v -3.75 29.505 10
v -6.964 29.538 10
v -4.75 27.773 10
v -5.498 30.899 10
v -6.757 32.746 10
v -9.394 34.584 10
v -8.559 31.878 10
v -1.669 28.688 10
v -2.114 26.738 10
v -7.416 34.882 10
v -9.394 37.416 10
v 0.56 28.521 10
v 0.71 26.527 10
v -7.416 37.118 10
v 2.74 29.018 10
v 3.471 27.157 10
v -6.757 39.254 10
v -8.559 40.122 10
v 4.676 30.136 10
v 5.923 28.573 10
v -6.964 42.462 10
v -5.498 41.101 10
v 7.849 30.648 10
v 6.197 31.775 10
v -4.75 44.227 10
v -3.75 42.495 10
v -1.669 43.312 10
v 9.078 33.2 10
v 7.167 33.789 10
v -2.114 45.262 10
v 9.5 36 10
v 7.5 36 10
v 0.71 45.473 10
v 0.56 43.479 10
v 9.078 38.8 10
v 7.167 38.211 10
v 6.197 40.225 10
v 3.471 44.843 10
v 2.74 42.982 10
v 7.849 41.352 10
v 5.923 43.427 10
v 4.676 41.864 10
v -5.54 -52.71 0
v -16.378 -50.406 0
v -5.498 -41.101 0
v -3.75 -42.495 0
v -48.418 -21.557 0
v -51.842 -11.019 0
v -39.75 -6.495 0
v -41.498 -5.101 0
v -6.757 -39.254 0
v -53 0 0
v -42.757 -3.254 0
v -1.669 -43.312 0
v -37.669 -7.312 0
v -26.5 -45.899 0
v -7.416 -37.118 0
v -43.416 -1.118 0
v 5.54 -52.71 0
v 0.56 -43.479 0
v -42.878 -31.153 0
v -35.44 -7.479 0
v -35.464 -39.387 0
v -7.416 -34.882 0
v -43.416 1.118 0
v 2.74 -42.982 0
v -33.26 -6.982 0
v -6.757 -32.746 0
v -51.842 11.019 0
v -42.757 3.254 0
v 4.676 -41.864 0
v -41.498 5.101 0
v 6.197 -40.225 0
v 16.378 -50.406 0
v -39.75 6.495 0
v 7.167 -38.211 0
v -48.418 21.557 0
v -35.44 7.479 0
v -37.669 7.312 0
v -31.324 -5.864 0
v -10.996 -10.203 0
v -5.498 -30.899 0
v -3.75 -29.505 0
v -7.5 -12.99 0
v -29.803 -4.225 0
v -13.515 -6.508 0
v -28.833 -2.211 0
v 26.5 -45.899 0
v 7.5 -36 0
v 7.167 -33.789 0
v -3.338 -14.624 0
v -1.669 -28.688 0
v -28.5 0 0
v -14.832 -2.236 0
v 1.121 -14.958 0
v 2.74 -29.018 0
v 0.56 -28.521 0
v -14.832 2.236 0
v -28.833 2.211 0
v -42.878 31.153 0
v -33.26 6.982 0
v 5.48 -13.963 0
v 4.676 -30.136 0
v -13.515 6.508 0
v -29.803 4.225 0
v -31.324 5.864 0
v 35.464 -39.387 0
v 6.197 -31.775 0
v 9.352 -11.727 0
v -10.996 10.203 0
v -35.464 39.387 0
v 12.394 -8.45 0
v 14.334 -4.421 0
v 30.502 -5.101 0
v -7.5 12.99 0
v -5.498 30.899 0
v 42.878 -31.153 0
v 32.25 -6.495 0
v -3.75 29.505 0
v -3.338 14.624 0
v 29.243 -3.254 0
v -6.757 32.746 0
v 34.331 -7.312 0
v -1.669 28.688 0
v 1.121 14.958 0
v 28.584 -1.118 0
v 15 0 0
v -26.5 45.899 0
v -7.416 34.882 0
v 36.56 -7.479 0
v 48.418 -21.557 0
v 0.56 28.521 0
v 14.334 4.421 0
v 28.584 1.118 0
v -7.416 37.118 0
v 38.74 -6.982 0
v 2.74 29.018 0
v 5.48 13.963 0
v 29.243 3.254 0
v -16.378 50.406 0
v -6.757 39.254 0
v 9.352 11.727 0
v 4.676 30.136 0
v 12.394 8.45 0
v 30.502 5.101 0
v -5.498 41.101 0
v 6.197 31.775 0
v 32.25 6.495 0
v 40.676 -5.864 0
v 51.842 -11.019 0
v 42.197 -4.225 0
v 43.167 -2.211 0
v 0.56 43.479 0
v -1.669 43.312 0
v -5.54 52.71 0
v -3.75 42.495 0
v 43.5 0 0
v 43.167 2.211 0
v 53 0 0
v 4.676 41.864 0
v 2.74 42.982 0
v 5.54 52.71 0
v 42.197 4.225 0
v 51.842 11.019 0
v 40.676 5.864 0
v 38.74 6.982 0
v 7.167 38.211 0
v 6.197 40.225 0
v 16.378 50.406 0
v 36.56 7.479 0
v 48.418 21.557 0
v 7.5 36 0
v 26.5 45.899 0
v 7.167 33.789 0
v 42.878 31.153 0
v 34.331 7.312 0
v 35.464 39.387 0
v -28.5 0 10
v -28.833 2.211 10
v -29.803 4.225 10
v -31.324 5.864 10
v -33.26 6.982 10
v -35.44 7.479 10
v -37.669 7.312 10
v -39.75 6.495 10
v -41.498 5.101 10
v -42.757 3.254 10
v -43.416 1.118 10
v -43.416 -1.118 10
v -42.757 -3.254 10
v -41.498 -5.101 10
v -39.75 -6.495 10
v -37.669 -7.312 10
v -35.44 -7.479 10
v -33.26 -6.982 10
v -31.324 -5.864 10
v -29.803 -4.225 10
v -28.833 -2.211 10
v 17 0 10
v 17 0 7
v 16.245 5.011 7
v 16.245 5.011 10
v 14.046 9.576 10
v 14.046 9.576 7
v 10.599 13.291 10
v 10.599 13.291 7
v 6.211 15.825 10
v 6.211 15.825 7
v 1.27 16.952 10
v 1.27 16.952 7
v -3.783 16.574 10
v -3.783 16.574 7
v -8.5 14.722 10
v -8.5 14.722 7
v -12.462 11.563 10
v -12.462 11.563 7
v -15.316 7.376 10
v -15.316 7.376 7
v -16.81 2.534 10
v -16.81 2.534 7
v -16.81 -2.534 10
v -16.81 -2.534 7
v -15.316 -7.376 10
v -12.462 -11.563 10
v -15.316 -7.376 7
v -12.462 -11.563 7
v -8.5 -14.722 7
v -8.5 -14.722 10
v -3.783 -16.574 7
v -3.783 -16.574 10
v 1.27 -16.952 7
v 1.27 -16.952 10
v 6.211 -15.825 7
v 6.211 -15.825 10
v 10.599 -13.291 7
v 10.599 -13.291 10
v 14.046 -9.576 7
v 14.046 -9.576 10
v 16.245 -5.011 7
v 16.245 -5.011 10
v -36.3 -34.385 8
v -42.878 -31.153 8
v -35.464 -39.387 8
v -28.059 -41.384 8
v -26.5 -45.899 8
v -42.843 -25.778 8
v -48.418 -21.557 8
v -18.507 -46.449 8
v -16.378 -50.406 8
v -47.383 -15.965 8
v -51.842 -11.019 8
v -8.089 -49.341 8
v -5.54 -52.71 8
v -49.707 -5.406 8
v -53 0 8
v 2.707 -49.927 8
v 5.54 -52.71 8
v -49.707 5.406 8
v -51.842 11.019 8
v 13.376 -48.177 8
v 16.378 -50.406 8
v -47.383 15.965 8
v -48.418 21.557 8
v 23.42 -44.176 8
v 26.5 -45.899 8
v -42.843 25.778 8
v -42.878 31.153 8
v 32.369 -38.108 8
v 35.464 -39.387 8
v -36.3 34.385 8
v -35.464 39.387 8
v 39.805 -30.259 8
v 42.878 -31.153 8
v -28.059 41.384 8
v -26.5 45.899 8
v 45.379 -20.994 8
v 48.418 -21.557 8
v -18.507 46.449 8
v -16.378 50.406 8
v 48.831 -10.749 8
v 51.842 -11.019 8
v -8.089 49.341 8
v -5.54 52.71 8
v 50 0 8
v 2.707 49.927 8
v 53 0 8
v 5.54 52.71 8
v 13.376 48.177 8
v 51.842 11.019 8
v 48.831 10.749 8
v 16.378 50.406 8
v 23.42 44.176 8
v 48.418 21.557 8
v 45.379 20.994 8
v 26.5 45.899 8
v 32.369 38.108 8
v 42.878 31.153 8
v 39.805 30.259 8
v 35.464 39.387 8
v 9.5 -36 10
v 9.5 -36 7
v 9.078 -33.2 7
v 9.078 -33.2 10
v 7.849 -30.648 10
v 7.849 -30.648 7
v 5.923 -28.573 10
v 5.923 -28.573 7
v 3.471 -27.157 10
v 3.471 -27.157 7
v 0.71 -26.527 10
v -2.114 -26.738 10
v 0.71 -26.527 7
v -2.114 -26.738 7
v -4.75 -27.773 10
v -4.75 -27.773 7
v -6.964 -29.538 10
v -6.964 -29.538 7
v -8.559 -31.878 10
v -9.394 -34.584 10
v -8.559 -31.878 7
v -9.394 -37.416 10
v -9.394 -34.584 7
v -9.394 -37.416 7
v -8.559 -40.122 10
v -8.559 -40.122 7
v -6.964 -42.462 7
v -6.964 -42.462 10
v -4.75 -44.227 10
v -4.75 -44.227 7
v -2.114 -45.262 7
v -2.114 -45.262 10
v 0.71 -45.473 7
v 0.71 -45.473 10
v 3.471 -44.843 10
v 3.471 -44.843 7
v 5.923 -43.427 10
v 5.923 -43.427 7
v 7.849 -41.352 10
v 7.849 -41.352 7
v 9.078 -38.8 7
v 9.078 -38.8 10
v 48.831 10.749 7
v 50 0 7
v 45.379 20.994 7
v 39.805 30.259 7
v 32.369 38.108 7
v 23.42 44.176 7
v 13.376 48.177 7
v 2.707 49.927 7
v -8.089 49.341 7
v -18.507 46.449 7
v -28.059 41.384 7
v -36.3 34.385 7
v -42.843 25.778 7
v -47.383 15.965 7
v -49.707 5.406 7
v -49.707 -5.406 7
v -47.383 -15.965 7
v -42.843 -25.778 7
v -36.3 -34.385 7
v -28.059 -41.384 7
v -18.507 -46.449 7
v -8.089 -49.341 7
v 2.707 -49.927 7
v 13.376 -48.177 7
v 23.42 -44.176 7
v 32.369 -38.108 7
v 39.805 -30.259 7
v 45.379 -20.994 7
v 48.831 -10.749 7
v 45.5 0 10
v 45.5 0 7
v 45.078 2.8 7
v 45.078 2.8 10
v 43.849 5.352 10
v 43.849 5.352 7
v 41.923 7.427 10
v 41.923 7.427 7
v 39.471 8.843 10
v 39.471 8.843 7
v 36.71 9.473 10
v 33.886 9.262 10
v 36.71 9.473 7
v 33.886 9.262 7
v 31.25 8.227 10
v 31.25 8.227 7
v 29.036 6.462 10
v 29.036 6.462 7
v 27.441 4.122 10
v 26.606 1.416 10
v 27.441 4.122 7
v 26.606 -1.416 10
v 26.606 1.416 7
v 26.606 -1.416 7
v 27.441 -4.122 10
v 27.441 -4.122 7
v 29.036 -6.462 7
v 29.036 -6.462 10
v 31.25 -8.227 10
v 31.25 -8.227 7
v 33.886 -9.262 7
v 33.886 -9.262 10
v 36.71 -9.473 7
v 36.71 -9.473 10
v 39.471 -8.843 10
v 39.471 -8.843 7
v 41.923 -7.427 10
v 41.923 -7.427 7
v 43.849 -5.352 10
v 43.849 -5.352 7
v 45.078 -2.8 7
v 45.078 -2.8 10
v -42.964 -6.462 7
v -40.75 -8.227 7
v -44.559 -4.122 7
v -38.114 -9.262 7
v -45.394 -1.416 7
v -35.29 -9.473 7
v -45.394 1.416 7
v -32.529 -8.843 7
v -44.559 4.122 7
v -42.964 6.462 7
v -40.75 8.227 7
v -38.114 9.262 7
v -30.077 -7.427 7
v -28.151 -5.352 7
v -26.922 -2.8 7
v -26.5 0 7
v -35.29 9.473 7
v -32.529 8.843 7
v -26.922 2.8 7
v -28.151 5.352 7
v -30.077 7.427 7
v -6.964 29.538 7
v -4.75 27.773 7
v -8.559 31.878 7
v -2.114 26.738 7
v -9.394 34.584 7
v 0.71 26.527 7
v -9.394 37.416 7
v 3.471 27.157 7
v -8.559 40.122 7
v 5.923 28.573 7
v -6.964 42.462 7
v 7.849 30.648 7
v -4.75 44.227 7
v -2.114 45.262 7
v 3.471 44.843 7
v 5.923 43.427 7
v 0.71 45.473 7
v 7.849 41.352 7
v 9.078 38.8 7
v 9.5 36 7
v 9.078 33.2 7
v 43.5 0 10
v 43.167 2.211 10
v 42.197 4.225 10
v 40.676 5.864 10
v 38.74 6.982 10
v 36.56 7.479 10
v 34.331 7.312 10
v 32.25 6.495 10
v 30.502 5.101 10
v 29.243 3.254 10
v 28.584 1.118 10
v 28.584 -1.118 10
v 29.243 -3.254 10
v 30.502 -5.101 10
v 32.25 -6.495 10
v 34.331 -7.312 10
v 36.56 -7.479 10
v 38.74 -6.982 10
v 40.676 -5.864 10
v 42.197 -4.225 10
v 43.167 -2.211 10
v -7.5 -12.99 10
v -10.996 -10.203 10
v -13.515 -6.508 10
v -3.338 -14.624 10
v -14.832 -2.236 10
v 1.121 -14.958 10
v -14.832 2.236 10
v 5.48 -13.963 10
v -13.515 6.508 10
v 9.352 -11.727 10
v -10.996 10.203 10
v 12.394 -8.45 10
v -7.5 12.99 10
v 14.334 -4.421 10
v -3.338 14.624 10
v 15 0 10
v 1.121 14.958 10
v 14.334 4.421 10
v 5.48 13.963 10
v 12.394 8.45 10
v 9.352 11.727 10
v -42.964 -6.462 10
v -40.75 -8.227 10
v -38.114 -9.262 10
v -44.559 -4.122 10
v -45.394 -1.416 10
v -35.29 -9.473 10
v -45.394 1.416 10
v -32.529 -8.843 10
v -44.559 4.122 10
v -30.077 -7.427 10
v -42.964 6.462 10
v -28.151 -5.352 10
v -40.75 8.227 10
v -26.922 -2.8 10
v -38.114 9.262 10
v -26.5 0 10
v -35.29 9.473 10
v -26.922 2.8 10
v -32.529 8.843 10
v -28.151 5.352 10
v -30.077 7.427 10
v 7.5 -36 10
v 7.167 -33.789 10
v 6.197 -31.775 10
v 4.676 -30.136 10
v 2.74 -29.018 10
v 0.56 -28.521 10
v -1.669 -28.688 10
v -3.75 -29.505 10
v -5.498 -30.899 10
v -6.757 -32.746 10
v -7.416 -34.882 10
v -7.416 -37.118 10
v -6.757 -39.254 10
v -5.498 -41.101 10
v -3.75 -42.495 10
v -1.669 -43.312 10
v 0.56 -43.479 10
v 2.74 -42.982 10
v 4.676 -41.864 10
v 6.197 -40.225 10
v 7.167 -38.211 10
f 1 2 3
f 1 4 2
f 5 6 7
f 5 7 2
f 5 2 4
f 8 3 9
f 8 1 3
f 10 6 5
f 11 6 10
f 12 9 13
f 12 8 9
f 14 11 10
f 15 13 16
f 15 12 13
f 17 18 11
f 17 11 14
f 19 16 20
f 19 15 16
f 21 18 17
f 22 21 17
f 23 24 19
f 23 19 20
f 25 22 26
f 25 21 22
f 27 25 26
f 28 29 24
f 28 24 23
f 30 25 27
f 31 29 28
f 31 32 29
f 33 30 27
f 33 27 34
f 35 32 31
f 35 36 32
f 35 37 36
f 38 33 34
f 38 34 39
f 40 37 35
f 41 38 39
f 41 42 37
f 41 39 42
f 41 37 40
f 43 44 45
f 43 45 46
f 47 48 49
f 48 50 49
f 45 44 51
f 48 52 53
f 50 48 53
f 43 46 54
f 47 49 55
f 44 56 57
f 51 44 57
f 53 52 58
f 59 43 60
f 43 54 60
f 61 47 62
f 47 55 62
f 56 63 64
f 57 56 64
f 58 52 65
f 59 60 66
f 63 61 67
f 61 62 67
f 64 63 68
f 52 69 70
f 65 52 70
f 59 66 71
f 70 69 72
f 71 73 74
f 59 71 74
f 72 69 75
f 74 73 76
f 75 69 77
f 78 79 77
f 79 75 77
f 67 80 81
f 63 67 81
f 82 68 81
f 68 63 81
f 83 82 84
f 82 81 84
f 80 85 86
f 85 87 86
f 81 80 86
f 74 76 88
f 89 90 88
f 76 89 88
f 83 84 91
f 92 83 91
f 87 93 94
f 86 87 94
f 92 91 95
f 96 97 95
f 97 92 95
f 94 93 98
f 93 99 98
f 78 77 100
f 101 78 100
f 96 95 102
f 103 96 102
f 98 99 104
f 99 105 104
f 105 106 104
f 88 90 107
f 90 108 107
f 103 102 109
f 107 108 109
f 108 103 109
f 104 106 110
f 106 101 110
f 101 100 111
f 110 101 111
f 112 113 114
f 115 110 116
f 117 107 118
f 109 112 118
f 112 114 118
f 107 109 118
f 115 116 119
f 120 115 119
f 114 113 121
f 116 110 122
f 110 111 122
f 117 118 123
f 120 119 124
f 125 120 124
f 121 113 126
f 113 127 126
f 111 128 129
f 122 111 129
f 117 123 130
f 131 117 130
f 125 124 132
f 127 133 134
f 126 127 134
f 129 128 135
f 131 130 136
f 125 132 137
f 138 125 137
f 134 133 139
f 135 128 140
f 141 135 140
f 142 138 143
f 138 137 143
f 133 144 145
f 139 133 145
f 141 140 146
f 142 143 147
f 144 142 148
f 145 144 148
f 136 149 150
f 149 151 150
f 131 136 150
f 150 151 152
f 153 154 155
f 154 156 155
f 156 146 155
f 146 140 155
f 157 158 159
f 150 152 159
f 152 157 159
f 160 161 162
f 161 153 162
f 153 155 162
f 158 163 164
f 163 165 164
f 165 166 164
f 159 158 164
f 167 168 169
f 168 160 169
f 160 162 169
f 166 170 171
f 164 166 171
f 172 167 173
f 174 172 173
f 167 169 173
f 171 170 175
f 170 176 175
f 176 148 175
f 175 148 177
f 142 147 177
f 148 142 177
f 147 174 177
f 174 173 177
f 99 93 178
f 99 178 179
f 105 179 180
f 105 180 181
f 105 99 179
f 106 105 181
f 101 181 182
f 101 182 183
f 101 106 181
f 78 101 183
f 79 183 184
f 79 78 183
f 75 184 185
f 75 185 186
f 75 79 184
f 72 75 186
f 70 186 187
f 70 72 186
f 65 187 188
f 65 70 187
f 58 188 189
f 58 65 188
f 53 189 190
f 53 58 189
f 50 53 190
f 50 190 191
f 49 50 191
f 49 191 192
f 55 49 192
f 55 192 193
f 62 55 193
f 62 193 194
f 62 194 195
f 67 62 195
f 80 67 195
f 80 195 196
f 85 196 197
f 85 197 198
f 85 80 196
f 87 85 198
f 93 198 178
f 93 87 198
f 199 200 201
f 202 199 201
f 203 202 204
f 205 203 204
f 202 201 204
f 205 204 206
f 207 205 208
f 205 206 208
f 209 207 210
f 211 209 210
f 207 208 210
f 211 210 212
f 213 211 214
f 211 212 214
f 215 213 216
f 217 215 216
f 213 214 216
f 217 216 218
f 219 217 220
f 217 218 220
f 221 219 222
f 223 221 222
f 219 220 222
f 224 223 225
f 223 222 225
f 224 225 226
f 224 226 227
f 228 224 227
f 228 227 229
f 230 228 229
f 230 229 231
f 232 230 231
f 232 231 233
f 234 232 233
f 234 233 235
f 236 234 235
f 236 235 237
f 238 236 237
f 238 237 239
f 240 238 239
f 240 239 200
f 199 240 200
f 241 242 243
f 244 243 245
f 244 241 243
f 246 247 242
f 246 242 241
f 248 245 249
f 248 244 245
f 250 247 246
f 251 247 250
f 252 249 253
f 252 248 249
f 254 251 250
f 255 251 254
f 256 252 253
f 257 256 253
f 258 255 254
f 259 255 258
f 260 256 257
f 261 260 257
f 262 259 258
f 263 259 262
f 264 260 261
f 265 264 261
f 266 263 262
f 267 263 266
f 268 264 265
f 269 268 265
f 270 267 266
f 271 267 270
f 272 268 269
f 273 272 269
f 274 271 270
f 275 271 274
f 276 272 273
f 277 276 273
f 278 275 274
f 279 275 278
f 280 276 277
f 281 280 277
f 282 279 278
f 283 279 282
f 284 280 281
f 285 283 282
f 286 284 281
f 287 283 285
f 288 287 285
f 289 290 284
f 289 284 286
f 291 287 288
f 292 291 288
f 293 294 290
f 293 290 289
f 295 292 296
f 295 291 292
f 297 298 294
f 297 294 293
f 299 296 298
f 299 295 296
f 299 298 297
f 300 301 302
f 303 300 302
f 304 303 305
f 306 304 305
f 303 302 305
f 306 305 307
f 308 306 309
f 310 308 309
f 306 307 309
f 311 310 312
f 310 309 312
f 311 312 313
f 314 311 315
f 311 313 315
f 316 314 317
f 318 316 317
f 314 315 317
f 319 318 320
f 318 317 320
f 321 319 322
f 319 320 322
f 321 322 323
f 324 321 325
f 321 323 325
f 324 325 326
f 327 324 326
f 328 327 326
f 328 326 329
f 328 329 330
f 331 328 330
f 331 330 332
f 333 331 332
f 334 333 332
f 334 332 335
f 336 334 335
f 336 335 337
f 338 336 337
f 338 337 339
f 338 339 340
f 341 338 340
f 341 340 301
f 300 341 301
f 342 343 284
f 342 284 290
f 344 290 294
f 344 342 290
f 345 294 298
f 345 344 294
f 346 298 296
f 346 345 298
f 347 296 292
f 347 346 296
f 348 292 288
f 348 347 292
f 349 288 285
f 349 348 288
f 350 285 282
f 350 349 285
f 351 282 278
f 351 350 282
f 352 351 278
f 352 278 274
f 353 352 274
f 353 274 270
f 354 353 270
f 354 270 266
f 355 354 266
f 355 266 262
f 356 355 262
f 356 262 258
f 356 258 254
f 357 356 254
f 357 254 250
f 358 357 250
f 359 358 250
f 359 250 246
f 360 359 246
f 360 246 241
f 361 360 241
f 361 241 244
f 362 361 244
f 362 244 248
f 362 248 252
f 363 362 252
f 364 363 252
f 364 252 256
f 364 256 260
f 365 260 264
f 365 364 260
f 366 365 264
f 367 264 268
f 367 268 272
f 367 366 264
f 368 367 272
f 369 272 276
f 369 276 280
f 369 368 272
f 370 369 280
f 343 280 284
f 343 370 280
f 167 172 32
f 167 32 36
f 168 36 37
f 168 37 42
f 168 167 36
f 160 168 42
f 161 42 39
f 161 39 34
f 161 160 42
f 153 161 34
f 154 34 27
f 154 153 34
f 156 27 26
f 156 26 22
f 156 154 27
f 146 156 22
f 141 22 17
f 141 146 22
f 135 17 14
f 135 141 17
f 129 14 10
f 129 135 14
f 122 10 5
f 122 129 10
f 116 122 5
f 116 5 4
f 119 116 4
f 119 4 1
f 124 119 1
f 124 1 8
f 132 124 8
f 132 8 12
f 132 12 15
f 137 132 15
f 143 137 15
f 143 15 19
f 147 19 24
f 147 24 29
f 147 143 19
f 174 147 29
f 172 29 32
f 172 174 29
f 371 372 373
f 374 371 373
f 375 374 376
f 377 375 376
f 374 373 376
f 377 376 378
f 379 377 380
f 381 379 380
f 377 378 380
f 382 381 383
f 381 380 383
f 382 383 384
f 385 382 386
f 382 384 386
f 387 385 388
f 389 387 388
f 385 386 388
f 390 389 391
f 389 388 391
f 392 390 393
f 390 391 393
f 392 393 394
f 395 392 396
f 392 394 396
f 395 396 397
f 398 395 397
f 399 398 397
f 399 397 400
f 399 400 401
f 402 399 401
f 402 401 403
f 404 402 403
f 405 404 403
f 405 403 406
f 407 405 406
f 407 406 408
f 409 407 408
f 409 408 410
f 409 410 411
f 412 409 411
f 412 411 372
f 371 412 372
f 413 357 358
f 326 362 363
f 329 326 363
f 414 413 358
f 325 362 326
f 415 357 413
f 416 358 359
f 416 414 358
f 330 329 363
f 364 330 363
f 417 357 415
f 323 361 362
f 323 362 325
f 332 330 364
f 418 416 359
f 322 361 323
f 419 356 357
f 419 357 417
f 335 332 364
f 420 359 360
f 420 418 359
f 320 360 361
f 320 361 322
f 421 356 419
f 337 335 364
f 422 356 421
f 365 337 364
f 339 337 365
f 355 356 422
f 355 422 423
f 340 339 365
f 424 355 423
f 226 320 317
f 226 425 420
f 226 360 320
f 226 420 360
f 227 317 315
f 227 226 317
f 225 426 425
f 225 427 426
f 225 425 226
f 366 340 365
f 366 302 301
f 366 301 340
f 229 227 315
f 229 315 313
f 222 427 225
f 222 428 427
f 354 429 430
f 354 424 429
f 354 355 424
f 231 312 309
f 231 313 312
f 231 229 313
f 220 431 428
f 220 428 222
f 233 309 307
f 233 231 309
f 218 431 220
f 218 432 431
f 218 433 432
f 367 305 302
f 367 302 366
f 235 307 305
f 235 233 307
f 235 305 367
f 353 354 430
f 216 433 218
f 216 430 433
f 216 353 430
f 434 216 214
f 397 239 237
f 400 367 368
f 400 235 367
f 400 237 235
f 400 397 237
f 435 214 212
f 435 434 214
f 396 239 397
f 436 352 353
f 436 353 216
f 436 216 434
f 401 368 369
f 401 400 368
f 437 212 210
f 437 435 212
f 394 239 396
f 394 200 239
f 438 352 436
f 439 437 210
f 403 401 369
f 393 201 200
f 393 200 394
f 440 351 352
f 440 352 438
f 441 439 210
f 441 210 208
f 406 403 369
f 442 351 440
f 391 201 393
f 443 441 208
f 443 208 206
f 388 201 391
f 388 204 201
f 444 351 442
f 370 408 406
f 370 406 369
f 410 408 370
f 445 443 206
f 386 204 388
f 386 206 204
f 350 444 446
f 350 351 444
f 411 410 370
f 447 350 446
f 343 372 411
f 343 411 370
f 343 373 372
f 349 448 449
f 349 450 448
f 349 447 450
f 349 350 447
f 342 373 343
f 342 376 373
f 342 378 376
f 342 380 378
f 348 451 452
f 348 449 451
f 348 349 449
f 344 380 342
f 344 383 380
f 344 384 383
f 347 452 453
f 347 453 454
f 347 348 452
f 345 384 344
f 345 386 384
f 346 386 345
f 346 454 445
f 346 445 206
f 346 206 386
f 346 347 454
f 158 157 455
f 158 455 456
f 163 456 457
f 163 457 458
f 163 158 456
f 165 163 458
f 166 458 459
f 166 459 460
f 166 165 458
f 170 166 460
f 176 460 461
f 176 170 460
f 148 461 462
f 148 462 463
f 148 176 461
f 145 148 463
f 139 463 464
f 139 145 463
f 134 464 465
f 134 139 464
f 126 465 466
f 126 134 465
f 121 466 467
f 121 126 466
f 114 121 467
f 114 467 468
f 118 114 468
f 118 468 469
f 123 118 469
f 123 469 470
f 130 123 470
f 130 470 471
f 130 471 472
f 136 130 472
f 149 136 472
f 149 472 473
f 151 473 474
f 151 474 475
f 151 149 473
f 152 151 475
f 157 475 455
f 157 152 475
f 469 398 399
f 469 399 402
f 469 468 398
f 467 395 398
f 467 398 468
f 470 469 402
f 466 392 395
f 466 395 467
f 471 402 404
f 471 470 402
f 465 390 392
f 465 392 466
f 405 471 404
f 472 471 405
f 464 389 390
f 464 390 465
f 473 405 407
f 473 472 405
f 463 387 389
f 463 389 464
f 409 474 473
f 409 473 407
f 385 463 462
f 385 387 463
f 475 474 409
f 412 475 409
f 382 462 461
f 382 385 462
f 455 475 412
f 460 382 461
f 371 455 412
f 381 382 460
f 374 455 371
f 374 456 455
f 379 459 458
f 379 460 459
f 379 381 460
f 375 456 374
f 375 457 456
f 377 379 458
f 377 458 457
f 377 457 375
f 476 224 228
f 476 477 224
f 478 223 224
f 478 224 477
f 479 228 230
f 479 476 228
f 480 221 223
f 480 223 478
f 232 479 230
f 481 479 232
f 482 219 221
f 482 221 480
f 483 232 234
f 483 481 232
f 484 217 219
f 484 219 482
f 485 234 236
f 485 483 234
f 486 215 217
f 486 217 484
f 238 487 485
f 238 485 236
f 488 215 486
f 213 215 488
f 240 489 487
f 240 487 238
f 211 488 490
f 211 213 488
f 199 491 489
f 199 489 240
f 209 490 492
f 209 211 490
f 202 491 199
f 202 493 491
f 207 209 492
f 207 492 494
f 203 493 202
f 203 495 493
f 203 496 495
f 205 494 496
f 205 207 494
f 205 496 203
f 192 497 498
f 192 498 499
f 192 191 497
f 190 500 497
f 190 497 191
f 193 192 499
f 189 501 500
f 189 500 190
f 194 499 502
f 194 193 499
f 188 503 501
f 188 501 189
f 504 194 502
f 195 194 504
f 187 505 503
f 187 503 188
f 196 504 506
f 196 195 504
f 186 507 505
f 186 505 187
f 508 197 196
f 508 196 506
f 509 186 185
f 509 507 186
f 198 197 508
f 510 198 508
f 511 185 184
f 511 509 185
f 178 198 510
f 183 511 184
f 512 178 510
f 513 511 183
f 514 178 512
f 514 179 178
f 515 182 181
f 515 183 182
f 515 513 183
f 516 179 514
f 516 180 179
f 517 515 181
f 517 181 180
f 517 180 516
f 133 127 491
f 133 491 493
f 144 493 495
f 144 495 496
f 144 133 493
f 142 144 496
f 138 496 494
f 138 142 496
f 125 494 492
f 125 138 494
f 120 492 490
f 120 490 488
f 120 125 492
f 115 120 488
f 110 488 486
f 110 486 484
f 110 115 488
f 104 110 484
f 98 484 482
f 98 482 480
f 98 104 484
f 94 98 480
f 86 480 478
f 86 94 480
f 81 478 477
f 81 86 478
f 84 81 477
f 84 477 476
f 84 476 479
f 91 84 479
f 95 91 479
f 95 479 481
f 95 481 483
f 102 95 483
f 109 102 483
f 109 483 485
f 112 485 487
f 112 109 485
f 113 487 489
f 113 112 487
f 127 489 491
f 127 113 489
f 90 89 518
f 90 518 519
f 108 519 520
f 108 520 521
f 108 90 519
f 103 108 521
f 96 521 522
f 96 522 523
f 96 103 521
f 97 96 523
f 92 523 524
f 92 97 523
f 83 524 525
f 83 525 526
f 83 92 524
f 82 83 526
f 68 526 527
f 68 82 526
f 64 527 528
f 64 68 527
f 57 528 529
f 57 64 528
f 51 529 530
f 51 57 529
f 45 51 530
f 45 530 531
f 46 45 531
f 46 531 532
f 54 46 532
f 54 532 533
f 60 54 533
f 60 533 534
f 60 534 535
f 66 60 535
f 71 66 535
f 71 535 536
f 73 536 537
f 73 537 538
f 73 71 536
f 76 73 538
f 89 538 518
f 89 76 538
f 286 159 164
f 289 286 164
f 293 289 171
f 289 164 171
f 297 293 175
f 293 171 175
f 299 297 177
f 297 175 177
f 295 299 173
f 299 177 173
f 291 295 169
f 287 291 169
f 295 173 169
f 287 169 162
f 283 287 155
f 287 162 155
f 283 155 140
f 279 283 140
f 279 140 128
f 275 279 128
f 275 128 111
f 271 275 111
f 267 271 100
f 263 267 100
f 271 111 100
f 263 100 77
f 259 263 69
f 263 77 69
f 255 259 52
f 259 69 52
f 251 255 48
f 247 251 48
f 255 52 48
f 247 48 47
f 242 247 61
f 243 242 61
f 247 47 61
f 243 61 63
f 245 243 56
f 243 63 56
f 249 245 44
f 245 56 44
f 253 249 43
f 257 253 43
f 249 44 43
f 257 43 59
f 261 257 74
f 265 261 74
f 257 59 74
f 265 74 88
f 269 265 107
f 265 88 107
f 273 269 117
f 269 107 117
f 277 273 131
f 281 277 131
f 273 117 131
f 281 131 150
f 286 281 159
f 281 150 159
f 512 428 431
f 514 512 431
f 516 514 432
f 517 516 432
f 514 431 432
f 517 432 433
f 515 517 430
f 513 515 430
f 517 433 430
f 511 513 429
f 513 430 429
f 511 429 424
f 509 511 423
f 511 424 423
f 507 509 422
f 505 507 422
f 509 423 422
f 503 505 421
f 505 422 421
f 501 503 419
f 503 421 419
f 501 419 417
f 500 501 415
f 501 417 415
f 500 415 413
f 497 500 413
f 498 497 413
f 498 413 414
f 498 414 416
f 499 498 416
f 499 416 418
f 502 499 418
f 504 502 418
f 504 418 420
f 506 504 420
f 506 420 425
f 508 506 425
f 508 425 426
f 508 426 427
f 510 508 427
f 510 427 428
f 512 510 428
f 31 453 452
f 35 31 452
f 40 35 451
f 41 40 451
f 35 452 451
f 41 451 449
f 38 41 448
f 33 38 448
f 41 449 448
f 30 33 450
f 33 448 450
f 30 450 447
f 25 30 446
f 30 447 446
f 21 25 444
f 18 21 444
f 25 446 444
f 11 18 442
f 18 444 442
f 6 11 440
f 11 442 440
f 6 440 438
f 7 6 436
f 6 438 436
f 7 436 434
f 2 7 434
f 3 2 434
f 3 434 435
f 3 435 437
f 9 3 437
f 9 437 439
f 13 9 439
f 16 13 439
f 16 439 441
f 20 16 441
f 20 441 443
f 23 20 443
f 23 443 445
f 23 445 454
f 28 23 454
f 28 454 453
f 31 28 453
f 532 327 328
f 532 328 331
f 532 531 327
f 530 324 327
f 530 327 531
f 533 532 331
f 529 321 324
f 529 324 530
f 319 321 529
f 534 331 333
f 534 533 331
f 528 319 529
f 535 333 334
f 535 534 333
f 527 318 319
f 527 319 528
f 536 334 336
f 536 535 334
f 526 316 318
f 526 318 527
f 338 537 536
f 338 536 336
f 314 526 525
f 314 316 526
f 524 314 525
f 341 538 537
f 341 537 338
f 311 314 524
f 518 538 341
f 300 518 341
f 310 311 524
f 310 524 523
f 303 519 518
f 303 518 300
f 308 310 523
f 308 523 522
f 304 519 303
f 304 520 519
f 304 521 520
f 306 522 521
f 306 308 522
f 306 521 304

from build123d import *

# Parameters (mm, degrees)
F0_R     = 50
F0_R_2   = 9.5
F0_R_3   = 17
F1_DEPTH = 7
F0_R_4   = 53
F2_DEPTH = 8
F0_R_5   = 7.5
F0_R_6   = 15
F3_DEPTH = 10


with BuildPart() as f1:
    # F0 (on Top) → F1 (new body)
    with BuildSketch(Plane.XY):
        Circle(F0_R)
        with Locations((0, -36)):
            Circle(F0_R_2, mode=Mode.SUBTRACT)
        with Locations((-36, 0)):
            Circle(F0_R_2, mode=Mode.SUBTRACT)
        Circle(F0_R_3, mode=Mode.SUBTRACT)
        with Locations((36, 0)):
            Circle(F0_R_2, mode=Mode.SUBTRACT)
        with Locations((0, 36)):
            Circle(F0_R_2, mode=Mode.SUBTRACT)
    extrude(amount=F1_DEPTH)

    # F0 (on Top) → F2 (join)
    with BuildSketch(Plane.XY):
        Circle(F0_R_4)
        Circle(F0_R, mode=Mode.SUBTRACT)
    extrude(amount=F2_DEPTH)

    # F0 (on Top) → F3 (join)
    with BuildSketch(Plane.XY):
        with Locations((0, 36)):
            Circle(F0_R_2)
        with Locations((0, 36)):
            Circle(F0_R_5, mode=Mode.SUBTRACT)
        with Locations((-36, 0)):
            Circle(F0_R_2)
        with Locations((-36, 0)):
            Circle(F0_R_5, mode=Mode.SUBTRACT)
        with Locations((36, 0)):
            Circle(F0_R_2)
        with Locations((36, 0)):
            Circle(F0_R_5, mode=Mode.SUBTRACT)
        with Locations((0, -36)):
            Circle(F0_R_2)
        with Locations((0, -36)):
            Circle(F0_R_5, mode=Mode.SUBTRACT)
        Circle(F0_R_3)
        Circle(F0_R_6, mode=Mode.SUBTRACT)
    extrude(amount=F3_DEPTH)


solid = f1.part
